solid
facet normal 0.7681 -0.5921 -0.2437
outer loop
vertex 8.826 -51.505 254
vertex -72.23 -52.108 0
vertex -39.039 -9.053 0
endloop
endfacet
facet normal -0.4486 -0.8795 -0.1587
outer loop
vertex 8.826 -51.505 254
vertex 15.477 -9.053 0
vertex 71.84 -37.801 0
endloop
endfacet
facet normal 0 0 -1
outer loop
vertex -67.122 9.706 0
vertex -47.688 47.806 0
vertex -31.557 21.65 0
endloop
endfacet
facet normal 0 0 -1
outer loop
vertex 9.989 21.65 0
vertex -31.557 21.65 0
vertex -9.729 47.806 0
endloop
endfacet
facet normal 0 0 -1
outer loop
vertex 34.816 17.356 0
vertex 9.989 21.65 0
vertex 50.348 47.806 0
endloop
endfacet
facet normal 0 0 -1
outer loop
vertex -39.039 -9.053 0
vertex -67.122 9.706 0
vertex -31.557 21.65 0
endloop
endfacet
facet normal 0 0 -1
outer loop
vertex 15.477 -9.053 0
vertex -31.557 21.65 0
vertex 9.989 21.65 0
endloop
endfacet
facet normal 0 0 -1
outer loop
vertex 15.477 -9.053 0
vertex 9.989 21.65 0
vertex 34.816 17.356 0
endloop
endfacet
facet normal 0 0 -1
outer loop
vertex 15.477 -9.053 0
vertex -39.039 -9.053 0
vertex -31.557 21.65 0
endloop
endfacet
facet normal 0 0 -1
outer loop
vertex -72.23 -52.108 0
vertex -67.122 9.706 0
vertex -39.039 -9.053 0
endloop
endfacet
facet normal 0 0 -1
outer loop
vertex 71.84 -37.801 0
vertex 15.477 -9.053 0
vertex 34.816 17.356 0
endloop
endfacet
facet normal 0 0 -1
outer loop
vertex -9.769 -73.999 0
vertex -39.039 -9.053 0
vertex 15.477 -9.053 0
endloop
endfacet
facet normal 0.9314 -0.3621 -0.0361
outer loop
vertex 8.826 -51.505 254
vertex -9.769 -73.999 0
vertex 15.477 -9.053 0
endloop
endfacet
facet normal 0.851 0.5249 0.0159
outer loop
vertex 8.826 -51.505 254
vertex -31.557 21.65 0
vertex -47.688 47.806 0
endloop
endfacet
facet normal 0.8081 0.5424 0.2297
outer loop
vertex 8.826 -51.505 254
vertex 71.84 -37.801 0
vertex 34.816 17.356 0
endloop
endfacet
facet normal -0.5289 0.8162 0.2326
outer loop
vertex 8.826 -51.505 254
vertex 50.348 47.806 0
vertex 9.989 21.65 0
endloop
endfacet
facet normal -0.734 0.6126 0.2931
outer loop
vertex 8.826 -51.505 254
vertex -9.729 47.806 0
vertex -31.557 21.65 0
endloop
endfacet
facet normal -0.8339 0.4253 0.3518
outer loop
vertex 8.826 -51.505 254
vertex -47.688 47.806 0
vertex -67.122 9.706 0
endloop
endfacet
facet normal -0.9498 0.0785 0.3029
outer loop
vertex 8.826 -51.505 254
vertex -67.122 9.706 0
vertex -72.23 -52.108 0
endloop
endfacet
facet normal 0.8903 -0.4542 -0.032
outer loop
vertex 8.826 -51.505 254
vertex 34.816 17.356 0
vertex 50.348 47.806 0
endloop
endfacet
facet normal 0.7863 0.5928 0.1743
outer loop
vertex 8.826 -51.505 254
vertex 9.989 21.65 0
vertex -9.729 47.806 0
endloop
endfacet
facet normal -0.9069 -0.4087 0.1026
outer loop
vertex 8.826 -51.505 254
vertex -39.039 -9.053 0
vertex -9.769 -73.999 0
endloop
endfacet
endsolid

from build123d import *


with BuildPart() as f3:
    # F0 (on Top) → F3 section 0
    with BuildSketch(Plane.XY, mode=Mode.PRIVATE) as f3_s0:
        Polygon((-47.688171, 47.806267), (-67.121834, 9.70584), (-72.229996, -52.108184), (-39.03887, -9.052839), (-9.768937, -73.99904), (15.477421, -9.052839), (71.840197, -37.801471), (34.815956, 17.355996), (50.347548, 47.806267), (9.988855, 21.649893), (-9.729384, 47.806267), (-31.556629, 21.649893), align=None)
    loft([f3_s0.sketch, Vertex(8.825648, -51.505208, 254)])


solid = f3.part
